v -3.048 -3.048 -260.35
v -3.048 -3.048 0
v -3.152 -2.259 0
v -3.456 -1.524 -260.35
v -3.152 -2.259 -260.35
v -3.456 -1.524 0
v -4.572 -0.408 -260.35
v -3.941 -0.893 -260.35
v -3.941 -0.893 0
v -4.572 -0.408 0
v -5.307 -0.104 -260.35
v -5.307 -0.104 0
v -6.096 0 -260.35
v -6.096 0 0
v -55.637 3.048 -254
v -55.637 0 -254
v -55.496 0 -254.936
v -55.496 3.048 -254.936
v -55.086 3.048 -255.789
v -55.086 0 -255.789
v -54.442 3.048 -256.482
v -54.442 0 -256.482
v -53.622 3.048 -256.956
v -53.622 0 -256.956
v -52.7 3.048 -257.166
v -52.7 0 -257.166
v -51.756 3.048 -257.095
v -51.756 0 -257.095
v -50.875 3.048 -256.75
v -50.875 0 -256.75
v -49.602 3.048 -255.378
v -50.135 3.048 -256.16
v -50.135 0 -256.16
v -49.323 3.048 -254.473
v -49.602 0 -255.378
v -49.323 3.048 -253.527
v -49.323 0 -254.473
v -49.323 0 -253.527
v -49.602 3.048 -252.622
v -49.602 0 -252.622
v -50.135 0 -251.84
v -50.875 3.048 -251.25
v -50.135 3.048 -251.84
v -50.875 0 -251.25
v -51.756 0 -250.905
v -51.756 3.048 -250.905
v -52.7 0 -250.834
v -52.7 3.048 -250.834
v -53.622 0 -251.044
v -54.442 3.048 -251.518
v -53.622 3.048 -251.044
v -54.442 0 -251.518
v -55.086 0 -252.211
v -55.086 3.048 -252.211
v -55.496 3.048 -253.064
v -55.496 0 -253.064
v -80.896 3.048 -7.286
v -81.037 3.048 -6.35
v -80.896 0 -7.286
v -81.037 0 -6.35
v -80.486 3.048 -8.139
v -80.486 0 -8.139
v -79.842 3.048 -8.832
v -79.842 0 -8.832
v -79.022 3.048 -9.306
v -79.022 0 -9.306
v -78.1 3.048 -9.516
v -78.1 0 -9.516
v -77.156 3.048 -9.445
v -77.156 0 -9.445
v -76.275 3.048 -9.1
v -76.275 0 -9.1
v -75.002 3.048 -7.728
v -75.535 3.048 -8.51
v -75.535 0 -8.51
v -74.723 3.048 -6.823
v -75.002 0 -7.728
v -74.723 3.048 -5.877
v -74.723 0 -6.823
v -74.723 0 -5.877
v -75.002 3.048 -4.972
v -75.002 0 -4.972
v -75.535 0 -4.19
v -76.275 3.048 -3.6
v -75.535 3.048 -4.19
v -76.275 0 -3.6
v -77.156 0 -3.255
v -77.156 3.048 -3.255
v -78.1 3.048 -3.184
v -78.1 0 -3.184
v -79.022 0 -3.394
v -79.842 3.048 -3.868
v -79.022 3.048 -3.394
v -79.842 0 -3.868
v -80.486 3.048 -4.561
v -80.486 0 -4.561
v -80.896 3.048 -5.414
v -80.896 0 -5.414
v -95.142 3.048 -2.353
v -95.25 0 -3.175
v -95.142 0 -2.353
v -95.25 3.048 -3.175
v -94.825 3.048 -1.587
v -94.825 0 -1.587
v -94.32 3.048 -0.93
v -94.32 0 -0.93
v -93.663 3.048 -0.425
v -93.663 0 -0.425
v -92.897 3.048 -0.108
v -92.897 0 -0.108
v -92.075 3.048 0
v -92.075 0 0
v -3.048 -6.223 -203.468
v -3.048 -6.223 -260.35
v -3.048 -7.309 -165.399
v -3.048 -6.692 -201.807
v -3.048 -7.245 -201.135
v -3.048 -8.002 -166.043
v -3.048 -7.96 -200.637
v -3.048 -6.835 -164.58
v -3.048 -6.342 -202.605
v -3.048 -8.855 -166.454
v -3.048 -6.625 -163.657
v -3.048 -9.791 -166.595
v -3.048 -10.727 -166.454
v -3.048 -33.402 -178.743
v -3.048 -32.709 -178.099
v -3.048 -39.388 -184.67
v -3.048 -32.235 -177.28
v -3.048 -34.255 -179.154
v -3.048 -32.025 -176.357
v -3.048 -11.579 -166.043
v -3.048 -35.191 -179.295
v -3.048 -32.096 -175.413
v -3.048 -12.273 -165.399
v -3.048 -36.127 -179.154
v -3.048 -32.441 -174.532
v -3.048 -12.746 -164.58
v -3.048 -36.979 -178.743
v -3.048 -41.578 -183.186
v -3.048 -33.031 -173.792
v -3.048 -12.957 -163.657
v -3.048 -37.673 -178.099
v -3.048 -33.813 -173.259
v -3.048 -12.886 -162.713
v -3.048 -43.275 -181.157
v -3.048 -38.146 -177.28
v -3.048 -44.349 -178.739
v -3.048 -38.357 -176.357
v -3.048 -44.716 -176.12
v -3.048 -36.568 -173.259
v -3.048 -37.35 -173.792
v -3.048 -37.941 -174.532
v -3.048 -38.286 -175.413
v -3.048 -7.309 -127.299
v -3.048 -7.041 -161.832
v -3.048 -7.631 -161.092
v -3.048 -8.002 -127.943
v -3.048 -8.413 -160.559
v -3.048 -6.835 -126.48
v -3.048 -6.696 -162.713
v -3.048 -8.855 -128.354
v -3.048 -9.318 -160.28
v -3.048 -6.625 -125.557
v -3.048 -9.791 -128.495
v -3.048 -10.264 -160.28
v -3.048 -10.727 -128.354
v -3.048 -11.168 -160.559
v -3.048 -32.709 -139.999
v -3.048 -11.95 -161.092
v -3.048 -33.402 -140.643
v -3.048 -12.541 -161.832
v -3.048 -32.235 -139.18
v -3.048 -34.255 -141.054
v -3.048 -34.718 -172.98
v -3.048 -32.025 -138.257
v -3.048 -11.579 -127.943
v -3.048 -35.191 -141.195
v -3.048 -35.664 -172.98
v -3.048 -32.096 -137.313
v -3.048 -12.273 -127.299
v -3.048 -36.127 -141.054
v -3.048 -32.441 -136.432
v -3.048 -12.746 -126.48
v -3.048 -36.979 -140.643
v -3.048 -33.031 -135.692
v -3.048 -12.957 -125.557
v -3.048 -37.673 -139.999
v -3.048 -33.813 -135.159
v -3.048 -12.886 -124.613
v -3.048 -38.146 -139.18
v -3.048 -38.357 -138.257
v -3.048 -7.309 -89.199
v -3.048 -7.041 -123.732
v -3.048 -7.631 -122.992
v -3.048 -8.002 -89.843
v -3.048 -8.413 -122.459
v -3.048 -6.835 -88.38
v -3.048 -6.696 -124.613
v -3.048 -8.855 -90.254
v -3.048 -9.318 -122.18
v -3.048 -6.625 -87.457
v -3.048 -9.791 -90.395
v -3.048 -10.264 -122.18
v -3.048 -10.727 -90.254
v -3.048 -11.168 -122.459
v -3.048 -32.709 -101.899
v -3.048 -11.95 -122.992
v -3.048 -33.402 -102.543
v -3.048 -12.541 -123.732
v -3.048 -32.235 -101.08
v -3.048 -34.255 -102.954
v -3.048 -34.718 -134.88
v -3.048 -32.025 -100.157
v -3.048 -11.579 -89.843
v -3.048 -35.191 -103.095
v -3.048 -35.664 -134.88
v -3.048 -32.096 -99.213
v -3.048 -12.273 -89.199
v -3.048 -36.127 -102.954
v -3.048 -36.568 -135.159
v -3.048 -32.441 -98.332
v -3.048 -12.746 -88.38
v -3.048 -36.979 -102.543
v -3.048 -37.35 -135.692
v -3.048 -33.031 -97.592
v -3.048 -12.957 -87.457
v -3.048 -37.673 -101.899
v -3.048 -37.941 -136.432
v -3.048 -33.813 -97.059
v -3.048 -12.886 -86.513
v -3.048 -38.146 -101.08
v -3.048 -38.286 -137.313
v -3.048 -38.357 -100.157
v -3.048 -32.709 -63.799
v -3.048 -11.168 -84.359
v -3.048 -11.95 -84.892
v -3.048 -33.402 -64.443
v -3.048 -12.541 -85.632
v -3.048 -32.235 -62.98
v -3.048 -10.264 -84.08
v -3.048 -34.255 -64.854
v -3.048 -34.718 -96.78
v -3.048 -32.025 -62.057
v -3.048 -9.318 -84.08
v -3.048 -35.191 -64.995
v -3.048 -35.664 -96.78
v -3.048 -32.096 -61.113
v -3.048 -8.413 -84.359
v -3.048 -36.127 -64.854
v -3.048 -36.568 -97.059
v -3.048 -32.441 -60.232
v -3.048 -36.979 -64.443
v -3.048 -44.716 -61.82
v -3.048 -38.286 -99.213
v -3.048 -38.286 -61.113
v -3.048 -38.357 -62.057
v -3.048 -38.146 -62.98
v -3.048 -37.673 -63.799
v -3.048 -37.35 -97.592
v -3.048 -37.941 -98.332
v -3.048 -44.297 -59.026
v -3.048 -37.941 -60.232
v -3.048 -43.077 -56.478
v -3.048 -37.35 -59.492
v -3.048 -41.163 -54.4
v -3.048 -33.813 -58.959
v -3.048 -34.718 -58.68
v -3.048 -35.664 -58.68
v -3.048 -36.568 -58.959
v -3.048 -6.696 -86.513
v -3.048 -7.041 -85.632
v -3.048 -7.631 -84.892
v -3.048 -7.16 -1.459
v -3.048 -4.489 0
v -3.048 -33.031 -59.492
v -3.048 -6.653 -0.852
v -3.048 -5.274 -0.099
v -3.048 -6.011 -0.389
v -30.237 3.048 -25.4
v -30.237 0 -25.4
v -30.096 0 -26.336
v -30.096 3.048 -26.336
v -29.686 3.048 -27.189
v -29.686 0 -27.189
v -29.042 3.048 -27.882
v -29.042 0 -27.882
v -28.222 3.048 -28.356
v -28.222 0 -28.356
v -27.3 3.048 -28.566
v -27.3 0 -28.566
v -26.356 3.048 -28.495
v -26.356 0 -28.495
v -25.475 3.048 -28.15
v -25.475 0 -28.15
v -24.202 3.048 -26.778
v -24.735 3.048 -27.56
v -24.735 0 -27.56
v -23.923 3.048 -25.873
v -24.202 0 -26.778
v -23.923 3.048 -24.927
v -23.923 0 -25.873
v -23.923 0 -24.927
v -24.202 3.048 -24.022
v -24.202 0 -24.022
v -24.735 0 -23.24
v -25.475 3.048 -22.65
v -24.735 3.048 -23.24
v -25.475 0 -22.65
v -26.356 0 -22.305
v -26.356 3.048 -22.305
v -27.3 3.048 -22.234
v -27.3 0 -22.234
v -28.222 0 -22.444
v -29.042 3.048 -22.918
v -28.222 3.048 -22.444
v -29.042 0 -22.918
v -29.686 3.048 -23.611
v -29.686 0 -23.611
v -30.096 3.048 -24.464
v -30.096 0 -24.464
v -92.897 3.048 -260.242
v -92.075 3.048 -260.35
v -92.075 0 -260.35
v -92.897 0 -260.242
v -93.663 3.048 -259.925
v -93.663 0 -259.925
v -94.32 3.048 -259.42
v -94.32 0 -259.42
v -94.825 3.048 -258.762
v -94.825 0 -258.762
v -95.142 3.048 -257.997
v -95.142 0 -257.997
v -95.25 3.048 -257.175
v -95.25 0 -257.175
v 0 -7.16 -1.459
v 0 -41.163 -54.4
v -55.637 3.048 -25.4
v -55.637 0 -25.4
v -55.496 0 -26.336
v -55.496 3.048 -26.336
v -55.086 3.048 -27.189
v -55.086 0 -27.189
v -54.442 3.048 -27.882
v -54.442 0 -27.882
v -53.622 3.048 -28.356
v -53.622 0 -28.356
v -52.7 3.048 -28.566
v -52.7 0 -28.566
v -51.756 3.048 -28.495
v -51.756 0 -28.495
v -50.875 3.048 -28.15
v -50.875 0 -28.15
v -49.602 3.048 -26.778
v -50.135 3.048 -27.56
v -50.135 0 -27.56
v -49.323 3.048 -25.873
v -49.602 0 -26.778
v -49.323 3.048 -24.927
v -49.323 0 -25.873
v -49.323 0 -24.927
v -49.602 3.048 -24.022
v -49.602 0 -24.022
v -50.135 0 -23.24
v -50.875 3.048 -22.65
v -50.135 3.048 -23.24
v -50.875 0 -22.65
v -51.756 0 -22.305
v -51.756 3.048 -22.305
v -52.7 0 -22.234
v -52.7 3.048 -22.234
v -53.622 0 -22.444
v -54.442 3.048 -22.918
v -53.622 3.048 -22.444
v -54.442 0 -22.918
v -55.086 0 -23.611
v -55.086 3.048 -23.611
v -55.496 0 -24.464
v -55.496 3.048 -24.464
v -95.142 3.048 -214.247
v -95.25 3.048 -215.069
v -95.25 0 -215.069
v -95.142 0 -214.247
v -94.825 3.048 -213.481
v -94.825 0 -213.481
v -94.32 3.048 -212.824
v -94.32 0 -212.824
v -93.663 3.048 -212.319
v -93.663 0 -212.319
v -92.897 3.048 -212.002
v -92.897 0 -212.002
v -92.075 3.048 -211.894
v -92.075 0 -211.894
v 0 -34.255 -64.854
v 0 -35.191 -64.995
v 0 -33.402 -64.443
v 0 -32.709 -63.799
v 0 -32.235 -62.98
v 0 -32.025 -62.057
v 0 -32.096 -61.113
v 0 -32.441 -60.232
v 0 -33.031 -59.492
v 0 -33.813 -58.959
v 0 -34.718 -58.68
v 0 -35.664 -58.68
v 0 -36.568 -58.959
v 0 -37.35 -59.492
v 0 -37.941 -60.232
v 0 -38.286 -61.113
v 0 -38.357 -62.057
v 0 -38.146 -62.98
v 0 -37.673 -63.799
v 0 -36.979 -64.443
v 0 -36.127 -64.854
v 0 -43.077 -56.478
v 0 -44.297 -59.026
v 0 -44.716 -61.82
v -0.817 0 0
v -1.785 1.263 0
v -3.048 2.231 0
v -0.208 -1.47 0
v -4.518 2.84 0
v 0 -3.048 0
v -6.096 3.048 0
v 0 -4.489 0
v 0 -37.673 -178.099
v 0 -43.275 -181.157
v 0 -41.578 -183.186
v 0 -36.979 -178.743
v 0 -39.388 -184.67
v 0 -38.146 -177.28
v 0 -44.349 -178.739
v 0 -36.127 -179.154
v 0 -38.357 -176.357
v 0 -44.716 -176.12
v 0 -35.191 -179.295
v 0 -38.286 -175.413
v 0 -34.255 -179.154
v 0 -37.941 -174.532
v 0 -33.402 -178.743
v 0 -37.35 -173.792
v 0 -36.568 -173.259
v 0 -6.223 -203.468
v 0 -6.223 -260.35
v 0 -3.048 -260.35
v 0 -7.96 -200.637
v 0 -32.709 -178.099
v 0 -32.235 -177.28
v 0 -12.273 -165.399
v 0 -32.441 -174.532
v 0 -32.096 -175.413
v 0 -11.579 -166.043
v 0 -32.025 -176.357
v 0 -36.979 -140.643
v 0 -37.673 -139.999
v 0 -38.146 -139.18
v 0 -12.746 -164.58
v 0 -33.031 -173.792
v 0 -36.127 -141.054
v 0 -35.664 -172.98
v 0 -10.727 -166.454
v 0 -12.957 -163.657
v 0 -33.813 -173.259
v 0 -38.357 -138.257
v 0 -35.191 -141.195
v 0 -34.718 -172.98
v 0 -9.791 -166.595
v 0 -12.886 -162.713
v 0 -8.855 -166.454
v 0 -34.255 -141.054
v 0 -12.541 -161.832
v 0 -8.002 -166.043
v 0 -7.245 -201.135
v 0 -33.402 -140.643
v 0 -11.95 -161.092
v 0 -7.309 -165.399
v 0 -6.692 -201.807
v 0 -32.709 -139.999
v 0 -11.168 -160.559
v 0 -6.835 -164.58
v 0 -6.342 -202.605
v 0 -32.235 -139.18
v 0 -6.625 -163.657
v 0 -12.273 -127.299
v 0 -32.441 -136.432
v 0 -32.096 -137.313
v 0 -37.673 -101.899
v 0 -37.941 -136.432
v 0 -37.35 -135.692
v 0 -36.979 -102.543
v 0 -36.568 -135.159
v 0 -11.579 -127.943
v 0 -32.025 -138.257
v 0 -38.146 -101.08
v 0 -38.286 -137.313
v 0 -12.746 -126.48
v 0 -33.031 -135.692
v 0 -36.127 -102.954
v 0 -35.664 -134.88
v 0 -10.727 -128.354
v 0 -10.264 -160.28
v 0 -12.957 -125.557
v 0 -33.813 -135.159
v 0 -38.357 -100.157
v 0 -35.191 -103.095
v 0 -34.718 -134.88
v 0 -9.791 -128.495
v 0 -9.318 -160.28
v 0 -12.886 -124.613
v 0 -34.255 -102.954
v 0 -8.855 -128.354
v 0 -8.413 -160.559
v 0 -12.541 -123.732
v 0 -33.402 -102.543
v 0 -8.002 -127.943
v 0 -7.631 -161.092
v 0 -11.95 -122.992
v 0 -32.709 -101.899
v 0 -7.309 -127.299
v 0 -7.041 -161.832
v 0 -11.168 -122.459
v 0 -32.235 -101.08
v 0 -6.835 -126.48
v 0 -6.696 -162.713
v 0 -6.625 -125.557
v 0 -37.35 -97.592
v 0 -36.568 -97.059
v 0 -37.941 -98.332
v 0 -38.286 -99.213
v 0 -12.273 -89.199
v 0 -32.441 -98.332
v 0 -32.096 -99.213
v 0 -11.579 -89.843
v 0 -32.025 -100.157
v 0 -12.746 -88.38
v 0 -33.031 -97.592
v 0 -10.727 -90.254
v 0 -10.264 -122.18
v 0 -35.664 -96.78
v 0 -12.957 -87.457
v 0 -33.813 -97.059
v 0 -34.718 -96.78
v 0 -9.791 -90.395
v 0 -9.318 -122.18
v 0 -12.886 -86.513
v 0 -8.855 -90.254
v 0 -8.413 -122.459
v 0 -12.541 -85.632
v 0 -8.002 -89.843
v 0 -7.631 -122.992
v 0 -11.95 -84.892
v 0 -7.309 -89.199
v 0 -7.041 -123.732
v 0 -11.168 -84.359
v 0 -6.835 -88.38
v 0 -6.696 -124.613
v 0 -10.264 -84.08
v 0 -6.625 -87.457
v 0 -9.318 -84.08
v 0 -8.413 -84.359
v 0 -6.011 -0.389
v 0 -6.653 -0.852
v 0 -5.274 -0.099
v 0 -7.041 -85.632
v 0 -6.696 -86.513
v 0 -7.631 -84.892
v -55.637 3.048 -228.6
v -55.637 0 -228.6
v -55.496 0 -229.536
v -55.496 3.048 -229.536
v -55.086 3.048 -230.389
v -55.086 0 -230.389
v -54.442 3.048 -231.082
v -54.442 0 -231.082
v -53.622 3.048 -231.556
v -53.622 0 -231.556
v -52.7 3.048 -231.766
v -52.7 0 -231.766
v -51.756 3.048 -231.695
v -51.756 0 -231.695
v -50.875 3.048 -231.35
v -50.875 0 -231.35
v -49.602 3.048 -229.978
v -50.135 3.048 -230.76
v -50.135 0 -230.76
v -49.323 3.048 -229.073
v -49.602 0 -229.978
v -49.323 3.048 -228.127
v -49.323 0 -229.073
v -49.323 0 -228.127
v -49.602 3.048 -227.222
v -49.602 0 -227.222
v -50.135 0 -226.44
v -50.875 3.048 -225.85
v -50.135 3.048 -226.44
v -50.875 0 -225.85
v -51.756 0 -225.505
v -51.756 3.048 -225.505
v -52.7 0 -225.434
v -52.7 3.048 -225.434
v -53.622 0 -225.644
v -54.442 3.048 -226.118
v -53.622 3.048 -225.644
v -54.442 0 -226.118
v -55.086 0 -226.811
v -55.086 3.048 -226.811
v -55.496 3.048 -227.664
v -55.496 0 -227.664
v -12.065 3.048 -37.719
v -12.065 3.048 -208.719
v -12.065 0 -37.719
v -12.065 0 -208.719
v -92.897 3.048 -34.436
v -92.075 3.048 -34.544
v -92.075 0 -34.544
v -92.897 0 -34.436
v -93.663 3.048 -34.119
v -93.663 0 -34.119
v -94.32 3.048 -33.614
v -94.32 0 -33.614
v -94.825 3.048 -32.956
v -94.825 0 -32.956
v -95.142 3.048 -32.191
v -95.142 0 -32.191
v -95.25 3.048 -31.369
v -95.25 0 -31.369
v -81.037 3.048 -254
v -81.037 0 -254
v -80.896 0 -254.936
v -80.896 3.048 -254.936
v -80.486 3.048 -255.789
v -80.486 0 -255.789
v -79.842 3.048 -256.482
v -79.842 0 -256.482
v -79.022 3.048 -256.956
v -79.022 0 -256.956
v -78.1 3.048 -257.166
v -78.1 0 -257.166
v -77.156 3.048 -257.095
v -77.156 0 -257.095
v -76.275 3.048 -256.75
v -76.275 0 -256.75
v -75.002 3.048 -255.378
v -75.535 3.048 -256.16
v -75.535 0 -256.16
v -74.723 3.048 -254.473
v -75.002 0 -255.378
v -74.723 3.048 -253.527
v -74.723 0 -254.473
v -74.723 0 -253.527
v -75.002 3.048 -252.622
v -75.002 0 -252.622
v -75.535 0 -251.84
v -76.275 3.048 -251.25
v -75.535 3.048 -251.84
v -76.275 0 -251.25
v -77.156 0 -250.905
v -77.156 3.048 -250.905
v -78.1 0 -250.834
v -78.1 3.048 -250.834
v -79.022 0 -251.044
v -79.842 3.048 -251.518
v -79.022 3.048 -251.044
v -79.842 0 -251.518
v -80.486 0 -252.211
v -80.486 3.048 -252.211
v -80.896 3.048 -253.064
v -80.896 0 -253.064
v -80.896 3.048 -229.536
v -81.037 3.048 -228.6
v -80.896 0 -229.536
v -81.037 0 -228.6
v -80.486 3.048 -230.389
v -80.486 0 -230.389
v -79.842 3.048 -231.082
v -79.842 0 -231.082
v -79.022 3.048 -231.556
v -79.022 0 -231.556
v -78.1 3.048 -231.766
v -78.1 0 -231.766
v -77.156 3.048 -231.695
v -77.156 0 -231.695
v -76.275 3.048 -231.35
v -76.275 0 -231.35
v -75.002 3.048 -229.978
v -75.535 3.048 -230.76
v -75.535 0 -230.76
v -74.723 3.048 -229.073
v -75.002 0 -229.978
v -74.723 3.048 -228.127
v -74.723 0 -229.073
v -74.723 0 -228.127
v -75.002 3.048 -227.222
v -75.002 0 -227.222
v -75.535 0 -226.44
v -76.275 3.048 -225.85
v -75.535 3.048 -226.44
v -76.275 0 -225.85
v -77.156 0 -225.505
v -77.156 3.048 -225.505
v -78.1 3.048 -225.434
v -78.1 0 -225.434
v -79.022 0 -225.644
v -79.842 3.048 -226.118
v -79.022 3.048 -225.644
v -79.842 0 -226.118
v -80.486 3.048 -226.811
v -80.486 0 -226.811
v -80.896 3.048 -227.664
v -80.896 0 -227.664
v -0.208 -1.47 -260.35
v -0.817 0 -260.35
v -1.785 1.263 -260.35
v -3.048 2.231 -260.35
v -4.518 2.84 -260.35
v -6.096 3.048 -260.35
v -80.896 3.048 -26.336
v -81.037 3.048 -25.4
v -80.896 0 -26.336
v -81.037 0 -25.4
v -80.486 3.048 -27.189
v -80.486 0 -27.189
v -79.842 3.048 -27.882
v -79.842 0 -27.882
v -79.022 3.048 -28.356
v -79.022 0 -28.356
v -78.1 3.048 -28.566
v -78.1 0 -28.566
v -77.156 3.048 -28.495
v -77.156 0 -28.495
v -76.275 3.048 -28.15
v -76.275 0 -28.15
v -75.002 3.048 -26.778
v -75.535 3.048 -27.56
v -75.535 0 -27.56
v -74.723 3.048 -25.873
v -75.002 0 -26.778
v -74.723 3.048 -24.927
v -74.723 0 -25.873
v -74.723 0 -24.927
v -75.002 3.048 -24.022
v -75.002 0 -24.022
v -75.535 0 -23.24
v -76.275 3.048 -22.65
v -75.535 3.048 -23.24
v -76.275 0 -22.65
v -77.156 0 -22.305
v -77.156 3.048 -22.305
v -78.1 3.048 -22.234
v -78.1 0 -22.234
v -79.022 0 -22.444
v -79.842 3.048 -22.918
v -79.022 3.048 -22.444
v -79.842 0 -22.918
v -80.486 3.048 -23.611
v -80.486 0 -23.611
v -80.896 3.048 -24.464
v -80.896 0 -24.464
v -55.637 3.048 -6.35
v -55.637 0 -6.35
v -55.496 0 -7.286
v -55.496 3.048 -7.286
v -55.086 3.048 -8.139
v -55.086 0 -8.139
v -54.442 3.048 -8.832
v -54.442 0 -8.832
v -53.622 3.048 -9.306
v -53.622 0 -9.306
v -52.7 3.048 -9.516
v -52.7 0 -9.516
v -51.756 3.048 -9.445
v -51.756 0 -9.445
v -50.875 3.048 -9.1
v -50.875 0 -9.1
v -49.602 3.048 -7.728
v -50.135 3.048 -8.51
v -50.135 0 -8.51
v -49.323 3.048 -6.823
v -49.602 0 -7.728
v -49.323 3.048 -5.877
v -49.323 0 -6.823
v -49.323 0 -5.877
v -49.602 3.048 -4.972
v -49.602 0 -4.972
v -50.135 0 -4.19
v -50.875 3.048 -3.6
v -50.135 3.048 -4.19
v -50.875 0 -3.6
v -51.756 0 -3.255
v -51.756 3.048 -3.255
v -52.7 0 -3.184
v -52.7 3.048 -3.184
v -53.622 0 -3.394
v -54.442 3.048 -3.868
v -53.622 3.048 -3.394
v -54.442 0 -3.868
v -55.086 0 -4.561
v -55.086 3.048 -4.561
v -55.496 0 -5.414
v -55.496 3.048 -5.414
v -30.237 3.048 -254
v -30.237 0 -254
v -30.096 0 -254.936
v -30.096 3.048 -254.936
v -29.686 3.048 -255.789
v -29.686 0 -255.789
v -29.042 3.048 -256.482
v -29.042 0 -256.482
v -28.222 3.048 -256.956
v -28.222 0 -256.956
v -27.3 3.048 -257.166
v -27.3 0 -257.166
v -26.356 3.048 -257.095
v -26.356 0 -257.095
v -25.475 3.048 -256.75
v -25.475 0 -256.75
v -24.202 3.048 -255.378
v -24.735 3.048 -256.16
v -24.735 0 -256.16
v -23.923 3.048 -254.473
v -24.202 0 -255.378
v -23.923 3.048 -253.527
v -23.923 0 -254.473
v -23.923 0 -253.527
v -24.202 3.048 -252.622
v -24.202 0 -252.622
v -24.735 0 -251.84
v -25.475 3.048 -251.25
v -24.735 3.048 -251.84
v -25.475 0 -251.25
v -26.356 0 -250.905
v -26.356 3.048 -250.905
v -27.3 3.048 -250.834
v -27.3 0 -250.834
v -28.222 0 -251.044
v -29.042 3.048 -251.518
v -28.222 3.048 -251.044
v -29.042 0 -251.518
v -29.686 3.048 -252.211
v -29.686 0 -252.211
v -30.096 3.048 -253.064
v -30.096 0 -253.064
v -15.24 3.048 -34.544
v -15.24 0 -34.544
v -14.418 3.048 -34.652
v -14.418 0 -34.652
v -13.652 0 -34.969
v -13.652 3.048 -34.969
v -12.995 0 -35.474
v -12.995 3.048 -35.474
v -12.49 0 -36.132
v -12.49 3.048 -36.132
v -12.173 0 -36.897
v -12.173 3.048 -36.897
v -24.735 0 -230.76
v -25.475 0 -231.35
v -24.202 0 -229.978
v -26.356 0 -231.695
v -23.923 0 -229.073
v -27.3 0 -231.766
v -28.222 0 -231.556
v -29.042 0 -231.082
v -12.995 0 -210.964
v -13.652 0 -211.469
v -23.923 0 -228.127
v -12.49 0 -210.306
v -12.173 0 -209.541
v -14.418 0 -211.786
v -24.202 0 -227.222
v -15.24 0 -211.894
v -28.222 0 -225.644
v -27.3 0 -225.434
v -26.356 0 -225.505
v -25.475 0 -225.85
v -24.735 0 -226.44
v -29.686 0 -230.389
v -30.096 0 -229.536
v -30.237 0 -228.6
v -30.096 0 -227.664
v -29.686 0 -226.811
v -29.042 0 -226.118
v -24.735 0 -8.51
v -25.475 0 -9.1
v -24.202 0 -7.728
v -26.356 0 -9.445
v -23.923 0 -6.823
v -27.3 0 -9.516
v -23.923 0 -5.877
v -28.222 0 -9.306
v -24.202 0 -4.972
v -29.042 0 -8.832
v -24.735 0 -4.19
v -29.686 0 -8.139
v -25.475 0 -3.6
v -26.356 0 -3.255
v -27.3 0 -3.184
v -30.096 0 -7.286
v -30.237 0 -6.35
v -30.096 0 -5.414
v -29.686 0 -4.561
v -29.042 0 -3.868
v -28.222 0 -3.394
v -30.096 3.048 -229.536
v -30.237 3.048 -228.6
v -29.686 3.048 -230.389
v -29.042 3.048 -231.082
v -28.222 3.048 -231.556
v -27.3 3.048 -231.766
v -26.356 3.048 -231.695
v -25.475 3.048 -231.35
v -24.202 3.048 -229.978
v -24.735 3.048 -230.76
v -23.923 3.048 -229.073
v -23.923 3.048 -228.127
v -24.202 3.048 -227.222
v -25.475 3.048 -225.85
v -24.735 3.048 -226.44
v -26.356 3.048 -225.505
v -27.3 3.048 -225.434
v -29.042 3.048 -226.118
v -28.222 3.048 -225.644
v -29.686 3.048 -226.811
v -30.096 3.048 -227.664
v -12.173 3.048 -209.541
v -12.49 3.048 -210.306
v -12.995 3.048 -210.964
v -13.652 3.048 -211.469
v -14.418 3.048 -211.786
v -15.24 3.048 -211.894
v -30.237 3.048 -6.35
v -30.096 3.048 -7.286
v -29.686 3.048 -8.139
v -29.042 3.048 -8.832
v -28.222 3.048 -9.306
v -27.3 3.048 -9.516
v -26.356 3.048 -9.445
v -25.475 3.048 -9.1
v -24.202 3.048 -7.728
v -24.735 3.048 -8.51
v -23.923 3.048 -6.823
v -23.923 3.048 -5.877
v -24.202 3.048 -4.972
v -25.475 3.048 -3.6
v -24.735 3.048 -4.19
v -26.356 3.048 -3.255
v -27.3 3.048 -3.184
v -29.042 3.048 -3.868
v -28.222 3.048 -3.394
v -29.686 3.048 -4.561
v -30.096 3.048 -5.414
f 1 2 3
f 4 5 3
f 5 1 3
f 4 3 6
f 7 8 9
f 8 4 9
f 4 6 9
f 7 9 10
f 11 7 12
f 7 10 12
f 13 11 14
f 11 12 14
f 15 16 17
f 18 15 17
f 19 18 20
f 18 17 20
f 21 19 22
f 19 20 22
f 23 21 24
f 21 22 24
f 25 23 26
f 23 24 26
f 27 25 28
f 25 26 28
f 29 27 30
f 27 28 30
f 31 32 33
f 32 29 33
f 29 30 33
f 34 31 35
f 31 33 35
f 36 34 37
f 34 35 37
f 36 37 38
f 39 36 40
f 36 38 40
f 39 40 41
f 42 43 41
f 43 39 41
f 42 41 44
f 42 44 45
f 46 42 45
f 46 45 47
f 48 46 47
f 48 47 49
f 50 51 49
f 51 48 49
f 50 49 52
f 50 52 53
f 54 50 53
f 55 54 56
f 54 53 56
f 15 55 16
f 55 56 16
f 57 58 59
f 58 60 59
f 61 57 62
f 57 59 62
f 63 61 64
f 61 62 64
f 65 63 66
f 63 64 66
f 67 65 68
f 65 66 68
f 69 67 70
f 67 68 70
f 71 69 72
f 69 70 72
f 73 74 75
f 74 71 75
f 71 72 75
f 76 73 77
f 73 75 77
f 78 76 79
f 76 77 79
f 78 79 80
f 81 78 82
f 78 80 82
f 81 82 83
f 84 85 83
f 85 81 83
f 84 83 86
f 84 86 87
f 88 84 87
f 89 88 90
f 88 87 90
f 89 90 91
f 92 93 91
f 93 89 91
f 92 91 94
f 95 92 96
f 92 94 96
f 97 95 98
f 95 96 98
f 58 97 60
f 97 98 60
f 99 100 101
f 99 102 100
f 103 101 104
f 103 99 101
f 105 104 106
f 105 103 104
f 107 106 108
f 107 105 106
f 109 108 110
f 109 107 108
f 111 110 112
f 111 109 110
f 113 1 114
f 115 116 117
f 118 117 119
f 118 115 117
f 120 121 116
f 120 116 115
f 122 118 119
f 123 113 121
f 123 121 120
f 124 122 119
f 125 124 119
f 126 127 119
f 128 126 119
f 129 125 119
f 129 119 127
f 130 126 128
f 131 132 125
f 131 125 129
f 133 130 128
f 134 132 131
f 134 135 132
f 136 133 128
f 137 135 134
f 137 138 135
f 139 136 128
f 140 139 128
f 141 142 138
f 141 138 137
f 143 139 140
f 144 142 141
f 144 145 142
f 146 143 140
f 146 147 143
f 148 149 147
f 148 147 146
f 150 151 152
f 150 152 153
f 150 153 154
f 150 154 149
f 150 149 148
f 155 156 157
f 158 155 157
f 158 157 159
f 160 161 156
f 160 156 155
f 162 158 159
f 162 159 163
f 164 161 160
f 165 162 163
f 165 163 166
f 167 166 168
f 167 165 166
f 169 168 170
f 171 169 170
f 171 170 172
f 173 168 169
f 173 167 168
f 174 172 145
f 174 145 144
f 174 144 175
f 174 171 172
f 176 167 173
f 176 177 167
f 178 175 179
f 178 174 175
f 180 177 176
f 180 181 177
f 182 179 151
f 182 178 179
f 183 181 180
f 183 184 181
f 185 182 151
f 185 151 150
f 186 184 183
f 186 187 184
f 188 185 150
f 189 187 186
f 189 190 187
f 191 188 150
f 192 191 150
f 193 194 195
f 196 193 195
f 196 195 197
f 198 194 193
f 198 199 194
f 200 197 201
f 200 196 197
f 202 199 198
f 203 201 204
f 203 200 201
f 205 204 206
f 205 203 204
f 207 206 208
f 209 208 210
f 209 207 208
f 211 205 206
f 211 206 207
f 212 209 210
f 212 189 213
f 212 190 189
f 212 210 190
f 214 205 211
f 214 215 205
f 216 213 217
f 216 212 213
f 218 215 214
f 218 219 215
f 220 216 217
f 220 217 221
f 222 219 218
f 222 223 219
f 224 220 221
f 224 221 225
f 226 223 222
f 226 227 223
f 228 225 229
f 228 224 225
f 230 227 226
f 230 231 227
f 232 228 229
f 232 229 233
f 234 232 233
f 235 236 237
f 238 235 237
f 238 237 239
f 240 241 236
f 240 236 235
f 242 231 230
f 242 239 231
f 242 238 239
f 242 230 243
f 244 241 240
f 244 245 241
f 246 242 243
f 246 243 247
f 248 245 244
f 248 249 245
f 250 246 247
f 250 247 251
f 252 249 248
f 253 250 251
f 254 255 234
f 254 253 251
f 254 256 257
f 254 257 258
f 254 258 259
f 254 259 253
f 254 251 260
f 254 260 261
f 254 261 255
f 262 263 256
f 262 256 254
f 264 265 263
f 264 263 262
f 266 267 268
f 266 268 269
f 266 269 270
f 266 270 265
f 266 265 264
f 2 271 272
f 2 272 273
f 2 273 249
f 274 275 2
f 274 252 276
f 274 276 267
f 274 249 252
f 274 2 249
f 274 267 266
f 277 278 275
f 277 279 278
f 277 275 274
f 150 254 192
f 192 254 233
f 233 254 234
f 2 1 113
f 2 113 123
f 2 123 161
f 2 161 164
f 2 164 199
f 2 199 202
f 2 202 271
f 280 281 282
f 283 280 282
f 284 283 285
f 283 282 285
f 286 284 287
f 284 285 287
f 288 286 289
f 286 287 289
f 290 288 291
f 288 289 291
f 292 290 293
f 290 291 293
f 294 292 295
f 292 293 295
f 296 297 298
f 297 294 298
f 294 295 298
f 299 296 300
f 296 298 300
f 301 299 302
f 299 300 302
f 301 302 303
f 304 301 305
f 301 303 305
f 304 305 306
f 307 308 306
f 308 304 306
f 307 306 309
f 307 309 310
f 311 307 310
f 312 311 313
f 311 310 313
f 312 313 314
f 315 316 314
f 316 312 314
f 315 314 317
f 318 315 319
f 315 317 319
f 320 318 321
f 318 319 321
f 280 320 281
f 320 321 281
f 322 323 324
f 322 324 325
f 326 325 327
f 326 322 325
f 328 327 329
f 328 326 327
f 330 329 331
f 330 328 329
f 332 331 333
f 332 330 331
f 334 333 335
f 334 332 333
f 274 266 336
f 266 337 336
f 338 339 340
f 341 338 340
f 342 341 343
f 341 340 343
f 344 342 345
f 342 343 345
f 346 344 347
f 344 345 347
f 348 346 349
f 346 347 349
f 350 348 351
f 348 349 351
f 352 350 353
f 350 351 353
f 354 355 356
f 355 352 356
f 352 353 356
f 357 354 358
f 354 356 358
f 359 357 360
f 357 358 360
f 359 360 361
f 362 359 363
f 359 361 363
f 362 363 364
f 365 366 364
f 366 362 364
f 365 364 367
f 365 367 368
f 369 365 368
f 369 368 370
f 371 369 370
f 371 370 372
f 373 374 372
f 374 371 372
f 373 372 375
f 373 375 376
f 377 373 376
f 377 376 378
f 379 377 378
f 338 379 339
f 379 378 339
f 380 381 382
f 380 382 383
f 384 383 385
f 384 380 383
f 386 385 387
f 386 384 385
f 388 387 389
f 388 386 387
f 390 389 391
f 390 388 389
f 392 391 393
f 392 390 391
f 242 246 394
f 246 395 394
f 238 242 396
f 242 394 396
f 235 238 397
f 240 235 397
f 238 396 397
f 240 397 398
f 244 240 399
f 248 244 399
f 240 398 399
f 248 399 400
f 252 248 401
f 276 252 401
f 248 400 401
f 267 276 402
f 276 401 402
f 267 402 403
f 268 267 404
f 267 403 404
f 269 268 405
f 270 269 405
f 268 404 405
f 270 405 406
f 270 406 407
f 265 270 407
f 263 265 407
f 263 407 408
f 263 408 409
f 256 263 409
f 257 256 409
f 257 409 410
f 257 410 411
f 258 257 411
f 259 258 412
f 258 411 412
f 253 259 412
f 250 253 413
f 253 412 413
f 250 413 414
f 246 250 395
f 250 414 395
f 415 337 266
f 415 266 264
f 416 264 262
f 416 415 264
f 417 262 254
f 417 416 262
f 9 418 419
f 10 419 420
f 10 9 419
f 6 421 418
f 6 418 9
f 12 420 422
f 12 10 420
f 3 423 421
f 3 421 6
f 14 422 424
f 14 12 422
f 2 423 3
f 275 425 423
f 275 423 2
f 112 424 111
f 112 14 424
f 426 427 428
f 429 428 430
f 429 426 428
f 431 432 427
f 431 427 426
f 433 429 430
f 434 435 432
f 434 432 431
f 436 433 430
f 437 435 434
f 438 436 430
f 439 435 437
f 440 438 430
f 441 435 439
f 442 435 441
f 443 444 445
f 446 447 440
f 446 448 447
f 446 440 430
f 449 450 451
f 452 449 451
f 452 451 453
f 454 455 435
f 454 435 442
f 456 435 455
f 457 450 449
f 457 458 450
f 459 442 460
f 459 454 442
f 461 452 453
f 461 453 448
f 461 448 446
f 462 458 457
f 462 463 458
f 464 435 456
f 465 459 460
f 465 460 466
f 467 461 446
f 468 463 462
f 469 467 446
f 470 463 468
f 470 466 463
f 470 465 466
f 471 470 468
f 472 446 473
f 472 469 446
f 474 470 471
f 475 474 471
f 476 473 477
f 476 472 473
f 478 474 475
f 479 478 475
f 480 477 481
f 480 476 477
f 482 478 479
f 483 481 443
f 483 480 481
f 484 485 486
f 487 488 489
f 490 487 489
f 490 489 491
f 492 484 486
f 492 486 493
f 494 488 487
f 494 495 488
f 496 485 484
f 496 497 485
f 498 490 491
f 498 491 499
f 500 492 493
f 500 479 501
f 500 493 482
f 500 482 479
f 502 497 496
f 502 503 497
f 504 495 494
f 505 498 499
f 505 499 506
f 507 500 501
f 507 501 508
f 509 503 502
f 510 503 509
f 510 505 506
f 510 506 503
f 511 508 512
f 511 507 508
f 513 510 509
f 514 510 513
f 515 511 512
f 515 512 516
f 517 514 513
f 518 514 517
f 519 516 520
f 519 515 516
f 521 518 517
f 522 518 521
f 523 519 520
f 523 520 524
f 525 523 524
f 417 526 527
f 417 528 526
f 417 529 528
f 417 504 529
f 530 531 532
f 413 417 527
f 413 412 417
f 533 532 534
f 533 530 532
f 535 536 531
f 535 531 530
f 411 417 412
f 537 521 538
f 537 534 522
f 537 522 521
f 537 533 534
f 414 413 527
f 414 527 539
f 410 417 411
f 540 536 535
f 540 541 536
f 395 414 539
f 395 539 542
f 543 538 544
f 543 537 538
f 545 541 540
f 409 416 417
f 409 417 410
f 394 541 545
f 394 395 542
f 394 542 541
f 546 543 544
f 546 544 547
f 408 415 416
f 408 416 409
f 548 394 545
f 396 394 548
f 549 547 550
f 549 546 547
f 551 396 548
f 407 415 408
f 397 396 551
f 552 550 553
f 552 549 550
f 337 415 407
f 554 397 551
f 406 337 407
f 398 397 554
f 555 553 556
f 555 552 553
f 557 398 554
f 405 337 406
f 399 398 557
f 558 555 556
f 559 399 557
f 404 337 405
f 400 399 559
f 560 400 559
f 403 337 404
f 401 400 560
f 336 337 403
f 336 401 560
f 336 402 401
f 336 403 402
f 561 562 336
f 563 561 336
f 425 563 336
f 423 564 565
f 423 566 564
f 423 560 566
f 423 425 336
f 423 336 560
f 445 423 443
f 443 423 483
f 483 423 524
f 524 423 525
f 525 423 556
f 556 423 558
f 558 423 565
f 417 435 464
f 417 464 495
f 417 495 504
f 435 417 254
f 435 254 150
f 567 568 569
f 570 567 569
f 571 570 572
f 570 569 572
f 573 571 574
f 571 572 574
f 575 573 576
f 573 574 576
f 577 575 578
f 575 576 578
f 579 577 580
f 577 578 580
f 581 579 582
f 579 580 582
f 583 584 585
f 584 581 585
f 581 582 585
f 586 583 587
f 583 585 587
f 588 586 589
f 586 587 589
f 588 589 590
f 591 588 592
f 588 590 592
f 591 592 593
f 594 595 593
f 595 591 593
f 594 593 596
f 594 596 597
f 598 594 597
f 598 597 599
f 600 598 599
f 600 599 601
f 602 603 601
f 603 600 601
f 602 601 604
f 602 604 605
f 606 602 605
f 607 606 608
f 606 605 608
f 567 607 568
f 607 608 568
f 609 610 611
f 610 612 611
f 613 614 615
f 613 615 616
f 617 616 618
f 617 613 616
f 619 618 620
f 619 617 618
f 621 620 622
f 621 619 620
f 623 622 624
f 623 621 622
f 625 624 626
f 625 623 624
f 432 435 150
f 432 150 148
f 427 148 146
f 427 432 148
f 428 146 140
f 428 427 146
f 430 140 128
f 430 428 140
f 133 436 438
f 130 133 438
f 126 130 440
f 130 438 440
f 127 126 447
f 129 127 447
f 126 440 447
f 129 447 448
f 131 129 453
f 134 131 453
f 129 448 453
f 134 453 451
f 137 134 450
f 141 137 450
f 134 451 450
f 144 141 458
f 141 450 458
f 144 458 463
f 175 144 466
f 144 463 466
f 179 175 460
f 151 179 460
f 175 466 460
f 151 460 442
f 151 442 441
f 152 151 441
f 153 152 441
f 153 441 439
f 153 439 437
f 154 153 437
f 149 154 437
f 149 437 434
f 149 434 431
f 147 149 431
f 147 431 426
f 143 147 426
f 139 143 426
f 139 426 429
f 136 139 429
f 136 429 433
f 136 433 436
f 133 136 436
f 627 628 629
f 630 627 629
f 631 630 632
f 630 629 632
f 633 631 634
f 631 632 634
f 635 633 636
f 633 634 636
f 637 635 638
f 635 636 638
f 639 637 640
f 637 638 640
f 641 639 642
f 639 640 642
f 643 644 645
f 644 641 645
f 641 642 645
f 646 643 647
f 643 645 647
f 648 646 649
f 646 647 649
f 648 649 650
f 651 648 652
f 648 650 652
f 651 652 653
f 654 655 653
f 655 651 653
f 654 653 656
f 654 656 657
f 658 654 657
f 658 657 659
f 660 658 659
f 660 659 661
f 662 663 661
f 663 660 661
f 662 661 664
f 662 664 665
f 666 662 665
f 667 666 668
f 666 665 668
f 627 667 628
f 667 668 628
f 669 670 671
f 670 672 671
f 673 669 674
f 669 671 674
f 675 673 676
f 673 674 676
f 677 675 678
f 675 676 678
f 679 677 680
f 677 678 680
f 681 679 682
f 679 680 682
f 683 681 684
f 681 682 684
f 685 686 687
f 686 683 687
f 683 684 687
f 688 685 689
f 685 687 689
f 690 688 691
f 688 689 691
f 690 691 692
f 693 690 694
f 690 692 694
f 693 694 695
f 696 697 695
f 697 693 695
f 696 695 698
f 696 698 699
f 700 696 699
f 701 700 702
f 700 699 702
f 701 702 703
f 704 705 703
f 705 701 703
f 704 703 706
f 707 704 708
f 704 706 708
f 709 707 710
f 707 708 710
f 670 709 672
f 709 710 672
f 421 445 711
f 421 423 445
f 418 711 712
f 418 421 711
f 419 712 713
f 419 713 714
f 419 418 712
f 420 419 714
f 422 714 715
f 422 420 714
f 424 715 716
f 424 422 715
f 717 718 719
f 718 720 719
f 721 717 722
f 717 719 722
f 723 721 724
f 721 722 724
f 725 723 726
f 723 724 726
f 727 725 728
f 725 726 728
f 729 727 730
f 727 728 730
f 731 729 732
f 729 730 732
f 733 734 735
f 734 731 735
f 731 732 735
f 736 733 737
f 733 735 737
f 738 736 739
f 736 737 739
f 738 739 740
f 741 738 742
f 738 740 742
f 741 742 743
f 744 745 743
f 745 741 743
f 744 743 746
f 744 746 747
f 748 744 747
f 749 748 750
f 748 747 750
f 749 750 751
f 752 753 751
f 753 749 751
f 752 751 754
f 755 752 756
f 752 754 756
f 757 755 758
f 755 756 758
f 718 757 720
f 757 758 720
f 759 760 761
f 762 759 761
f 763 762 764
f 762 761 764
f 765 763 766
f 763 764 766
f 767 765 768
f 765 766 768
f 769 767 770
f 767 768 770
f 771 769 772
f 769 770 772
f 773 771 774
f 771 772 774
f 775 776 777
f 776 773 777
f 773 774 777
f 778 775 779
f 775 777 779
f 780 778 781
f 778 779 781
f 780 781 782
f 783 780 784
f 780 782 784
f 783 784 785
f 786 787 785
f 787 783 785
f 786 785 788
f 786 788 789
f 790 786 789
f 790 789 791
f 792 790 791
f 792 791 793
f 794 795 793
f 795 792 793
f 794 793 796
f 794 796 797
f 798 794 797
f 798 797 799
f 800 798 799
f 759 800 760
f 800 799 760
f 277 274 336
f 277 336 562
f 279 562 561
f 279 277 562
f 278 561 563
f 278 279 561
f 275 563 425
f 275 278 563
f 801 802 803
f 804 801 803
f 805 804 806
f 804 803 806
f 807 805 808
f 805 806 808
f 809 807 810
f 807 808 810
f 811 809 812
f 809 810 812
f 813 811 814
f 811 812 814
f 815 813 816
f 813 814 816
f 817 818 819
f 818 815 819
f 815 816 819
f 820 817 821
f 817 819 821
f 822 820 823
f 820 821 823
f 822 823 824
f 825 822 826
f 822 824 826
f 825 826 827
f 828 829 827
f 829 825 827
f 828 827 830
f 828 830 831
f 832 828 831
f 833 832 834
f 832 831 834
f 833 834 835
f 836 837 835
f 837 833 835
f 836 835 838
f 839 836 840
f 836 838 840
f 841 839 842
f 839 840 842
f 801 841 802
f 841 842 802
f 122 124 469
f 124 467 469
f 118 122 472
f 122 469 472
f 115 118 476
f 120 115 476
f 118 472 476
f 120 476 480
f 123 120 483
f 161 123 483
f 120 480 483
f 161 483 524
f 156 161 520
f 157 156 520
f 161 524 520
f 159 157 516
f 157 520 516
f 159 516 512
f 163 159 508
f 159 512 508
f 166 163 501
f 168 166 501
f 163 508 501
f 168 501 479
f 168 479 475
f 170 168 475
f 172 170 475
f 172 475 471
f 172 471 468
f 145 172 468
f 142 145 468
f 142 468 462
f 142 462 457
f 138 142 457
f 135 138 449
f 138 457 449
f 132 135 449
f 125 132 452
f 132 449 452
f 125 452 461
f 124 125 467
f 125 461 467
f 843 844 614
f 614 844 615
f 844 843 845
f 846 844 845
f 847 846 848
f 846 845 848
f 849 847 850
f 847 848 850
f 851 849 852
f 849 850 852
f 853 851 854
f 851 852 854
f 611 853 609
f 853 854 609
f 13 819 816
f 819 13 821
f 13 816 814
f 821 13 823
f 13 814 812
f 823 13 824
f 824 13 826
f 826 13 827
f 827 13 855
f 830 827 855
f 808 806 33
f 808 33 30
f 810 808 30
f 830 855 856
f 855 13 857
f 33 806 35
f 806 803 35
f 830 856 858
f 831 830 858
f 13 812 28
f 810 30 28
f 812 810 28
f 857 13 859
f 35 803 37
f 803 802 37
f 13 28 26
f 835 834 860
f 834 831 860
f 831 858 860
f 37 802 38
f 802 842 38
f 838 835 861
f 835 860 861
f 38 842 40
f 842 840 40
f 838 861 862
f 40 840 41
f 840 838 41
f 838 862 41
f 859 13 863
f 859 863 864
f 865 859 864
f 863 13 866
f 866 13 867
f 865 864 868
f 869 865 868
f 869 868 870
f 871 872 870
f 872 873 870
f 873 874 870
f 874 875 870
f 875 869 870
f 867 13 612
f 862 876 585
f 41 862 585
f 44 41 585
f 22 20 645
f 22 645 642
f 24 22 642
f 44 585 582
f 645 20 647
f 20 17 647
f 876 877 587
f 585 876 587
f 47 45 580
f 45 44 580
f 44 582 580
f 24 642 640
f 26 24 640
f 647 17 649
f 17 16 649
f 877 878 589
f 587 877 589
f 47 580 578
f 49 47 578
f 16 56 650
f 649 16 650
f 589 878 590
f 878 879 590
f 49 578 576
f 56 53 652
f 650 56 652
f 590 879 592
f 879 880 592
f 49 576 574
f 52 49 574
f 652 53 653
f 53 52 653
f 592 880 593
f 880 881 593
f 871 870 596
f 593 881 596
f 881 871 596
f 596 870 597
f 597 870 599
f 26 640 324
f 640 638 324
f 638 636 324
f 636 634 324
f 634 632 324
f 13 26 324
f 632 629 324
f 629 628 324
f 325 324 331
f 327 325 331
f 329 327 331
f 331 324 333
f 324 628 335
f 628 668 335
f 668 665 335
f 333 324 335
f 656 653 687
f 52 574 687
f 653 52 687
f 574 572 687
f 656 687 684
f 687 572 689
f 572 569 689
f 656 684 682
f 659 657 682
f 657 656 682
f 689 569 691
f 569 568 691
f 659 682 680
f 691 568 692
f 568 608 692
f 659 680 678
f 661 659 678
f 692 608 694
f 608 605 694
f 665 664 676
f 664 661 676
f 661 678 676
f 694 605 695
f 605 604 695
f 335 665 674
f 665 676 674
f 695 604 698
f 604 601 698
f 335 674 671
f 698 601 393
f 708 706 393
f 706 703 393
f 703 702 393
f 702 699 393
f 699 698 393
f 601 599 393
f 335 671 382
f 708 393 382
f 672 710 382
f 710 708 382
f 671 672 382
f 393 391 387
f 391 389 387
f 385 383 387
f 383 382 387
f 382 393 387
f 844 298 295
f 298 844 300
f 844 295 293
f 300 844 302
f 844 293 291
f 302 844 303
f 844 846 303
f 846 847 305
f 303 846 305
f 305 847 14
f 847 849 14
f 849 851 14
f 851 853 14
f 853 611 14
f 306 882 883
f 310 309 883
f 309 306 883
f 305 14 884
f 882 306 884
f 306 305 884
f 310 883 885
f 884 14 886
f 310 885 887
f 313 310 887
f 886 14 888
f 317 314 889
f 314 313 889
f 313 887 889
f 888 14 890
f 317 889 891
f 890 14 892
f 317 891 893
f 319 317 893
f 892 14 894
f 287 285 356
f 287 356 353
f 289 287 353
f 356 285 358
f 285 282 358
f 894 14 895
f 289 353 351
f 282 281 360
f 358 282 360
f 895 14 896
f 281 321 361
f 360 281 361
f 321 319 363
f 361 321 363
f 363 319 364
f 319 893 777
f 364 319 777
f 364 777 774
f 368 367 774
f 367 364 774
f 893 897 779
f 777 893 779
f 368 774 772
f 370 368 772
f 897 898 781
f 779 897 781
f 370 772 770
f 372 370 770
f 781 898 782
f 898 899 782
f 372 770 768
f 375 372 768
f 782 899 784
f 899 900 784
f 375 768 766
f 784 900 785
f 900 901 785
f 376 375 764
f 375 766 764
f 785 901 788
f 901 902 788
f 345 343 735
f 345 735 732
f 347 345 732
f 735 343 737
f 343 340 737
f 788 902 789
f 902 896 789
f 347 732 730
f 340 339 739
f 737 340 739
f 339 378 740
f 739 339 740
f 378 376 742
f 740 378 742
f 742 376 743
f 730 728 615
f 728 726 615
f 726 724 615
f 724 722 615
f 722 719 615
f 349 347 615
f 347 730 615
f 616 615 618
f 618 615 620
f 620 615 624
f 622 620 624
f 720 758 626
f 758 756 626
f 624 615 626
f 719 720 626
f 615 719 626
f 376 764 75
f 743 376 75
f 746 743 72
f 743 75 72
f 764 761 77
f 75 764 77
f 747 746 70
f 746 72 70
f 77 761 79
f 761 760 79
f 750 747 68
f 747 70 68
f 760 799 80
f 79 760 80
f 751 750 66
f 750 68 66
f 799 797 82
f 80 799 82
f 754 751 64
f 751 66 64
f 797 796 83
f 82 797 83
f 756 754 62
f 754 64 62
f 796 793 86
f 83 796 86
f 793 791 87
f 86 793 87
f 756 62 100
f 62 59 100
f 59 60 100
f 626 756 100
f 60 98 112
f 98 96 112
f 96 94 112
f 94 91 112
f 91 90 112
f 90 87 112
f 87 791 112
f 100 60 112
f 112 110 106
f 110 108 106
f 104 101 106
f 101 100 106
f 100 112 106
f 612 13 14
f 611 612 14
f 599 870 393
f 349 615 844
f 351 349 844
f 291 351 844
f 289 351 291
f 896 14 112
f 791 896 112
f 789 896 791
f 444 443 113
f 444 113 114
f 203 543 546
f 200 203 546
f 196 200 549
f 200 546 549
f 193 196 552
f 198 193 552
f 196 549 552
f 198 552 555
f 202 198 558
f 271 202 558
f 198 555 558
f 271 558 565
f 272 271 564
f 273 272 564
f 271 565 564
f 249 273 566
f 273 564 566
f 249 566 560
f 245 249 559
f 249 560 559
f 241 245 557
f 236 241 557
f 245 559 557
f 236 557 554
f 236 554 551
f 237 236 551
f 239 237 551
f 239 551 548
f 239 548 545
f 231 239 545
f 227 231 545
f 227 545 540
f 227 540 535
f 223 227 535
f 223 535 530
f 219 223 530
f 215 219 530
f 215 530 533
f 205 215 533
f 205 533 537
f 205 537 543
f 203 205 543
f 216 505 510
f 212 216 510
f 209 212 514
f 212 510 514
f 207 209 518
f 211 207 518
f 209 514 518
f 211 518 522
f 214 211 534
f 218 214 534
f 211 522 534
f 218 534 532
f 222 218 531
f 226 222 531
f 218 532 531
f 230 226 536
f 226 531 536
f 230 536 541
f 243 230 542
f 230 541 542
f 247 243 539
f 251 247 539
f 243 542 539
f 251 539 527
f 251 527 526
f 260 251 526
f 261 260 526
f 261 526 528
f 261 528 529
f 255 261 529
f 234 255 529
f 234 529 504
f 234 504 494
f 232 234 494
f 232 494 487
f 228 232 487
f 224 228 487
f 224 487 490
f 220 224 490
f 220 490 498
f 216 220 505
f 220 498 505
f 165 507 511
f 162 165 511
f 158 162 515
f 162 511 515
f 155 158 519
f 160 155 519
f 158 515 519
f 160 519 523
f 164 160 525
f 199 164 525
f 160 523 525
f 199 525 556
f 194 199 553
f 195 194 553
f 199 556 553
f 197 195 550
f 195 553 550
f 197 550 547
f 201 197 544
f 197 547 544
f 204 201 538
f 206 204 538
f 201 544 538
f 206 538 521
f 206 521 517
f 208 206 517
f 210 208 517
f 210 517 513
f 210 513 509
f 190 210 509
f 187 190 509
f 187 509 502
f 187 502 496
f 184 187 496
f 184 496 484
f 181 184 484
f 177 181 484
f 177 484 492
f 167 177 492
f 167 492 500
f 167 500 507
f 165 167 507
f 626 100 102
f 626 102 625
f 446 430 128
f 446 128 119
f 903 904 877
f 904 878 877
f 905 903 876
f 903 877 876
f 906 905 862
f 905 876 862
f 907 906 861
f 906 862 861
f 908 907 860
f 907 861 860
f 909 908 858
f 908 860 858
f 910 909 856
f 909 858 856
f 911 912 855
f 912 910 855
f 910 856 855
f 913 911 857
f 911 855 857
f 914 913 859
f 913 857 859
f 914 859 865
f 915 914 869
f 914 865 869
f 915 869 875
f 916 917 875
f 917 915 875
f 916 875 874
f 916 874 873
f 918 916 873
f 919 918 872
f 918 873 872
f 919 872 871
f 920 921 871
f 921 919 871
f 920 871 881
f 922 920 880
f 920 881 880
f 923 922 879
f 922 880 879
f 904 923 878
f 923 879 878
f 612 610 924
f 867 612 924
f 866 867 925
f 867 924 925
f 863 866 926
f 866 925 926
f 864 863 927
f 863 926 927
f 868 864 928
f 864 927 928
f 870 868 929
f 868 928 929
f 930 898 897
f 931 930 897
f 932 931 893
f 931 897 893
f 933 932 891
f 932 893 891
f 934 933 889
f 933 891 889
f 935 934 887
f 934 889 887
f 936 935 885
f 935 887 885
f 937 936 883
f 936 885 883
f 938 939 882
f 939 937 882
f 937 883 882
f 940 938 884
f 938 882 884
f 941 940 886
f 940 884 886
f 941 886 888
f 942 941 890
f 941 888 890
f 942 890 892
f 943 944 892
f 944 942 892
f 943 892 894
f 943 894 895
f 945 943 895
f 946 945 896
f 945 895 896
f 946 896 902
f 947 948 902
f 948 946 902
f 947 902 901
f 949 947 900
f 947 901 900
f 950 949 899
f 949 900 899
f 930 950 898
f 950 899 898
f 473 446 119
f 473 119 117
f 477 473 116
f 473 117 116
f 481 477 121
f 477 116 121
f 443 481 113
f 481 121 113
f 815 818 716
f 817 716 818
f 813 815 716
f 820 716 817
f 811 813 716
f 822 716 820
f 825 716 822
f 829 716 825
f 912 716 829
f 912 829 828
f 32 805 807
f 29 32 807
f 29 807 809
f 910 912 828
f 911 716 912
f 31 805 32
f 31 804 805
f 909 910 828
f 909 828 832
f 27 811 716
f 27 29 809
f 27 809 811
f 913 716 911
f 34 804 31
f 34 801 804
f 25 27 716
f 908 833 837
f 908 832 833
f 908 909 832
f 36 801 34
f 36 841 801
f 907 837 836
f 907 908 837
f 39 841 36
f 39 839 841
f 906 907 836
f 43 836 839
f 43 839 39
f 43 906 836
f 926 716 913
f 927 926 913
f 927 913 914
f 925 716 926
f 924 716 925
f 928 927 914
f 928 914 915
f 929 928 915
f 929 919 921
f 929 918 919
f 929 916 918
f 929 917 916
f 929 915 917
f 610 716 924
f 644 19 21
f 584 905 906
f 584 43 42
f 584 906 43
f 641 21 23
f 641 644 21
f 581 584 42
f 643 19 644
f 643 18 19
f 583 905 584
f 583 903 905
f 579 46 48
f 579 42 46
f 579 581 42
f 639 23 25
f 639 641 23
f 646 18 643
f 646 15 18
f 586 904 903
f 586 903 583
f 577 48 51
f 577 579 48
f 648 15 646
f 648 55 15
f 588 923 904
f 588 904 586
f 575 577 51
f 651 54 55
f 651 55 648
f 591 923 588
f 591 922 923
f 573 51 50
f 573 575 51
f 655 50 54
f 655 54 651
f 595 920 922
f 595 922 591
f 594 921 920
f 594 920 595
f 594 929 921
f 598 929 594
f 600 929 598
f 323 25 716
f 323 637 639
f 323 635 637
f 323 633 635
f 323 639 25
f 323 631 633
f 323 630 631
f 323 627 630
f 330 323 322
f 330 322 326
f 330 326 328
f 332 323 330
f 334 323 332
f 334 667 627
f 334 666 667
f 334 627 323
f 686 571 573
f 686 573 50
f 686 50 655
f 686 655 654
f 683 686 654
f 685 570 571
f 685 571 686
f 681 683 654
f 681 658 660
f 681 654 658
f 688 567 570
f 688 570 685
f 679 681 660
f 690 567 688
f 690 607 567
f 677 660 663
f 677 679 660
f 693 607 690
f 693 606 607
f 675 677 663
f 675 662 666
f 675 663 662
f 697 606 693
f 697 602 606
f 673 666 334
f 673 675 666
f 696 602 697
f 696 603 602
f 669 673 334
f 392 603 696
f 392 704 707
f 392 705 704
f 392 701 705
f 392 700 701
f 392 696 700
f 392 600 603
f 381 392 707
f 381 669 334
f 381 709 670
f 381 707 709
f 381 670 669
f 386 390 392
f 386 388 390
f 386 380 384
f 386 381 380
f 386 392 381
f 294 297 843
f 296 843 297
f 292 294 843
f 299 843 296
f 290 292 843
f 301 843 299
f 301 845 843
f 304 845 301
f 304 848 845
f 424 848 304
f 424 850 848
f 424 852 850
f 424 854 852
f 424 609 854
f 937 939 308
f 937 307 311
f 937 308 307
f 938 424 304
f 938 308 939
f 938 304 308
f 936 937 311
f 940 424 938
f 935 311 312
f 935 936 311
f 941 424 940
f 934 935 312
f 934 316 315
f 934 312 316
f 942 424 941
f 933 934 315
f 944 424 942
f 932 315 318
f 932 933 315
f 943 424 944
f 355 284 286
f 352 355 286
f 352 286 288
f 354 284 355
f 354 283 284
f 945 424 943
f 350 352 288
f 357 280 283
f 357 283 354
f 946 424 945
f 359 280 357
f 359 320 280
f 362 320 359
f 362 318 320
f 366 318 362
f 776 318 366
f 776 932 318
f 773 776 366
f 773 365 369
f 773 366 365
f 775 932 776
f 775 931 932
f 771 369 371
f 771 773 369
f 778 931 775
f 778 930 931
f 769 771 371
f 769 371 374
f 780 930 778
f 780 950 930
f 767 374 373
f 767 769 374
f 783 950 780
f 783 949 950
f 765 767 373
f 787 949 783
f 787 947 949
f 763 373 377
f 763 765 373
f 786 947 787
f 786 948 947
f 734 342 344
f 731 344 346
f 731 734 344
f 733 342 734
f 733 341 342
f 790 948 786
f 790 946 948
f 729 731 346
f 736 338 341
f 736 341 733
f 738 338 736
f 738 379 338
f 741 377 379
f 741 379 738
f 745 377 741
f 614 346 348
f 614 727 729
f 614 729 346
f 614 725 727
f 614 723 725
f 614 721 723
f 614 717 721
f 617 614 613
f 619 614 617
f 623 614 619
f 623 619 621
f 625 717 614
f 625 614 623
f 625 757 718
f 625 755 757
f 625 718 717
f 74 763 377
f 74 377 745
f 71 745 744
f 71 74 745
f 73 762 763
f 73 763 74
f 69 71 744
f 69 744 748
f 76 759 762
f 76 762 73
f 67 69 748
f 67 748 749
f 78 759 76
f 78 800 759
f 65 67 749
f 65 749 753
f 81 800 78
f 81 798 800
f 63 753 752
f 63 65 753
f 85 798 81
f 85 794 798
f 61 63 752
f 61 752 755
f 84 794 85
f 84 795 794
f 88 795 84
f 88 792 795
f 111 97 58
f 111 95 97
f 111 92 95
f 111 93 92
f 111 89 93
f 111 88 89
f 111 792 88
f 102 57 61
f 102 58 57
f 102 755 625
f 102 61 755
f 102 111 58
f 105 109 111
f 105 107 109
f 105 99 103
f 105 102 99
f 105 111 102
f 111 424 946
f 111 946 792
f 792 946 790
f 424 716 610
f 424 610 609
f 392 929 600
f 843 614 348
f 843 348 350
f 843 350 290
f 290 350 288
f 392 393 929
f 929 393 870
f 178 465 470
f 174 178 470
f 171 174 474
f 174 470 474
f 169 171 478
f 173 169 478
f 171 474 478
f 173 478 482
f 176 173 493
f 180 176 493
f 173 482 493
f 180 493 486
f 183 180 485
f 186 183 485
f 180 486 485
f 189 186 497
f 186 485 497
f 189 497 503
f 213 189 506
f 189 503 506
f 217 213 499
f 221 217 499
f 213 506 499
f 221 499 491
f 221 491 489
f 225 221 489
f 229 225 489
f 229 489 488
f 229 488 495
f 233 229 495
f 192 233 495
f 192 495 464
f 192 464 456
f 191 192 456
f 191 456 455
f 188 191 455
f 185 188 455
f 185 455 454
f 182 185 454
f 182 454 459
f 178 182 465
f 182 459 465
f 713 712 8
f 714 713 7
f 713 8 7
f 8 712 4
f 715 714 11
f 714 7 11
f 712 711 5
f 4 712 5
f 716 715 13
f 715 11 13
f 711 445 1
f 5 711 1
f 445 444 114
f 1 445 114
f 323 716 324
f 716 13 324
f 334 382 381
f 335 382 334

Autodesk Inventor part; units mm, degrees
ref_plane "YZ Plane" through (0, 0, 0) normal (1, 0, 0) x (0, 1, 0)
ref_plane "XZ Plane" through (0, 0, 0) normal (0, 1, 0) x (-1, 0, 0)
ref_plane "XY Plane" through (0, 0, 0) normal (0, 0, 1) x (1, 0, 0)
sketch "Sketch1" plane through (0, 0, 0) normal (0, 1, 0) x (-1, 0, 0)
  line L0 (0, 0) -> (95.25, 0)
  line L1 (95.25, 0) -> (95.25, -260.35)
  line L2 (95.25, -260.35) -> (0, -260.35)
  line L3 (0, -260.35) -> (0, 0)
  circle A0 centre (77.8624, -6.35) radius 3.175
  circle A1 centre (77.8624, -25.4) radius 3.175
  circle A2 centre (52.4624, -6.35) radius 3.175
  circle A3 centre (52.4624, -25.4) radius 3.175
  circle A4 centre (27.0624, -6.35) radius 3.175
  circle A5 centre (27.0624, -25.4) radius 3.175
  circle A6 centre (77.8624, -228.6) radius 3.175
  circle A7 centre (77.8624, -254) radius 3.175
  circle A8 centre (52.4624, -228.6) radius 3.175
  circle A9 centre (52.4624, -254) radius 3.175
  circle A10 centre (27.0624, -228.6) radius 3.175
  circle A11 centre (27.0624, -254) radius 3.175
  line L4 (101.24, -208.719) -> (15.24, -208.719) construction
  line L5 (15.24, -208.719) -> (15.24, -37.719) construction
  line L6 (15.24, -37.719) -> (101.24, -37.719) construction
  line L7 (101.24, -37.719) -> (101.24, -208.719) construction
  line L8 (95.25, -211.894) -> (12.065, -211.894)
  line L9 (12.065, -211.894) -> (12.065, -34.544)
  line L10 (12.065, -34.544) -> (95.25, -34.544)
  dimension "d0" = 95.25
  dimension "d2" = 6.35
  dimension "d3" = 6.35
  dimension "d4" = 17.3876
  dimension "d7" = 19.05
  dimension "d10" = 25.4
  dimension "d15" = 25.4
  dimension "d18" = 25.4
  dimension "d21" = 222.25
  dimension "d22" = 6.35
  dimension "d54" = 86
  dimension "d55" = 177.35
  dimension "d56" = 171
  dimension "d57" = 3.175
  dimension "d58" = 34.544
  dimension "d59" = 3.175
  dimension "d60" = 12.065
extrude "Plate1" add sketch "Sketch1" along normal blind 3.048 contours L0 L1 L10 L9 L8 L2 L3
sketch "Sketch2" plane through (-3.048, 3.048, 0) normal (1, 0, 0) x (0, 1, 0)
  line L0 (0, -260.35) -> (0, 0)
  line L1 (0, 0) -> (-50.8, 0)
  line L2 (-50.8, 0) -> (-50.8, -260.35)
  line L3 (-50.8, -260.35) -> (0, -260.35)
edge flange "Flange1" height 50.8 angle 90 thickness 3.048 bend radius 3.048 thickness toward (1, 0, 0) relief tear relief width 3.048 relief depth 1.524 edges at (0, 0, -130.175) wall of the first edge with corners at (-3.048, 3.048, -260.35) (-3.048, 3.048, 0) (-3.048, -47.752, 0) (-3.048, -47.752, -260.35)
bend "Bend1"
corner "Corner1"
sketch "Sketch3" plane through (0, -47.752, 0) normal (1, 0, 0) x (0, 0, -1)
  circle A0 centre (87.2198, 37.9611) radius 3.175
  circle A1 centre (61.8198, 12.5611) radius 3.175
  line L0 (0, 0) -> (0, 44.704) projected
  line L1 (260.35, 0) -> (0, 0) projected
  circle A2 centre (99.9198, 12.5611) radius 3.175
  circle A3 centre (138.0198, 12.5611) radius 3.175
  circle A4 centre (176.1198, 12.5611) radius 3.175
  circle A5 centre (125.3198, 37.9611) radius 3.175
  circle A6 centre (163.4198, 37.9611) radius 3.175
  circle A7 centre (61.8198, 12.5611) radius 9.525
  circle A8 centre (176.1198, 12.5611) radius 9.525
  line L2 (61.8198, 3.0361) -> (176.1198, 3.0361)
  line L3 (0, 44.704) -> (260.35, 44.704) projected
  line L4 (260.35, 44.704) -> (260.35, 0) projected
  line L5 (54.3999, 6.5886) -> (0, 41.529)
  line L6 (184.6703, 8.3641) -> (201.5198, 41.529)
  line L7 (201.5198, 41.529) -> (260.35, 41.529)
  point P0 (0, 47.752)
  point P1 (178.7879, 44.704)
  dimension "d34" = 6.35
  dimension "d35" = 25.4
  dimension "d36" = 25.4
  dimension "d37" = 61.8198
  dimension "d40" = 38.1
  dimension "d47" = 38.1
  dimension "d61" = 6.35
  dimension "d62" = 6.35
  dimension "d64" = 3.175
  dimension "d65" = 3.175
  dimension "d66" = 25.4
extrude "Cut1" cut sketch "Sketch3" against normal blind 3.048 contours A0 | A1 | L0 L5 A7 L2 A8 L6 L7 L4 L1 | A2 | A3 | A4 | A5 | A6
fillet "Fillet1" radius 3.175 8 edges at (-95.25, 1.524, 0) (-95.25, 1.524, -34.544) (-12.065, 1.524, -34.544) (-95.25, 1.524, -211.894) (-12.065, 1.524, -211.894) (-95.25, 1.524, -260.35) (-1.524, -6.223, -201.5198) (-1.524, -6.223, 0)
equation "\"d65\" = d64"
equation "\"d52\" = Thickness"
equation "\"d23\" = Thickness"
equation "\"d24\" = BendReliefWidth"
equation "\"d25\" = BendReliefDepth"
equation "\"d26\" = MinimumRemnant"
equation "\"d27\" = TransitionRadius"
equation "\"d30\" = BendRadius"
equation "\"d31\" = CornerReliefSize"
equation "\"d32\" = GapSize"
equation "\"d33\" = JacobiRadiusSize"
equation "\"BendRadius\" = Thickness"
equation "\"BendReliefWidth\" = Thickness"
equation "\"BendReliefDepth\" = 0.5 * Thickness"
equation "\"CornerReliefSize\" = 4 * Thickness"
equation "\"MinimumRemnant\" = 2 * Thickness"
equation "\"TransitionRadius\" = BendRadius"
equation "\"JacobiRadiusSize\" = BendRadius"
equation "\"GapSize\" = Thickness"
equation "\"Thickness\" = 3.048"
properties part number "MainDriveMotorToPlateConnector"
